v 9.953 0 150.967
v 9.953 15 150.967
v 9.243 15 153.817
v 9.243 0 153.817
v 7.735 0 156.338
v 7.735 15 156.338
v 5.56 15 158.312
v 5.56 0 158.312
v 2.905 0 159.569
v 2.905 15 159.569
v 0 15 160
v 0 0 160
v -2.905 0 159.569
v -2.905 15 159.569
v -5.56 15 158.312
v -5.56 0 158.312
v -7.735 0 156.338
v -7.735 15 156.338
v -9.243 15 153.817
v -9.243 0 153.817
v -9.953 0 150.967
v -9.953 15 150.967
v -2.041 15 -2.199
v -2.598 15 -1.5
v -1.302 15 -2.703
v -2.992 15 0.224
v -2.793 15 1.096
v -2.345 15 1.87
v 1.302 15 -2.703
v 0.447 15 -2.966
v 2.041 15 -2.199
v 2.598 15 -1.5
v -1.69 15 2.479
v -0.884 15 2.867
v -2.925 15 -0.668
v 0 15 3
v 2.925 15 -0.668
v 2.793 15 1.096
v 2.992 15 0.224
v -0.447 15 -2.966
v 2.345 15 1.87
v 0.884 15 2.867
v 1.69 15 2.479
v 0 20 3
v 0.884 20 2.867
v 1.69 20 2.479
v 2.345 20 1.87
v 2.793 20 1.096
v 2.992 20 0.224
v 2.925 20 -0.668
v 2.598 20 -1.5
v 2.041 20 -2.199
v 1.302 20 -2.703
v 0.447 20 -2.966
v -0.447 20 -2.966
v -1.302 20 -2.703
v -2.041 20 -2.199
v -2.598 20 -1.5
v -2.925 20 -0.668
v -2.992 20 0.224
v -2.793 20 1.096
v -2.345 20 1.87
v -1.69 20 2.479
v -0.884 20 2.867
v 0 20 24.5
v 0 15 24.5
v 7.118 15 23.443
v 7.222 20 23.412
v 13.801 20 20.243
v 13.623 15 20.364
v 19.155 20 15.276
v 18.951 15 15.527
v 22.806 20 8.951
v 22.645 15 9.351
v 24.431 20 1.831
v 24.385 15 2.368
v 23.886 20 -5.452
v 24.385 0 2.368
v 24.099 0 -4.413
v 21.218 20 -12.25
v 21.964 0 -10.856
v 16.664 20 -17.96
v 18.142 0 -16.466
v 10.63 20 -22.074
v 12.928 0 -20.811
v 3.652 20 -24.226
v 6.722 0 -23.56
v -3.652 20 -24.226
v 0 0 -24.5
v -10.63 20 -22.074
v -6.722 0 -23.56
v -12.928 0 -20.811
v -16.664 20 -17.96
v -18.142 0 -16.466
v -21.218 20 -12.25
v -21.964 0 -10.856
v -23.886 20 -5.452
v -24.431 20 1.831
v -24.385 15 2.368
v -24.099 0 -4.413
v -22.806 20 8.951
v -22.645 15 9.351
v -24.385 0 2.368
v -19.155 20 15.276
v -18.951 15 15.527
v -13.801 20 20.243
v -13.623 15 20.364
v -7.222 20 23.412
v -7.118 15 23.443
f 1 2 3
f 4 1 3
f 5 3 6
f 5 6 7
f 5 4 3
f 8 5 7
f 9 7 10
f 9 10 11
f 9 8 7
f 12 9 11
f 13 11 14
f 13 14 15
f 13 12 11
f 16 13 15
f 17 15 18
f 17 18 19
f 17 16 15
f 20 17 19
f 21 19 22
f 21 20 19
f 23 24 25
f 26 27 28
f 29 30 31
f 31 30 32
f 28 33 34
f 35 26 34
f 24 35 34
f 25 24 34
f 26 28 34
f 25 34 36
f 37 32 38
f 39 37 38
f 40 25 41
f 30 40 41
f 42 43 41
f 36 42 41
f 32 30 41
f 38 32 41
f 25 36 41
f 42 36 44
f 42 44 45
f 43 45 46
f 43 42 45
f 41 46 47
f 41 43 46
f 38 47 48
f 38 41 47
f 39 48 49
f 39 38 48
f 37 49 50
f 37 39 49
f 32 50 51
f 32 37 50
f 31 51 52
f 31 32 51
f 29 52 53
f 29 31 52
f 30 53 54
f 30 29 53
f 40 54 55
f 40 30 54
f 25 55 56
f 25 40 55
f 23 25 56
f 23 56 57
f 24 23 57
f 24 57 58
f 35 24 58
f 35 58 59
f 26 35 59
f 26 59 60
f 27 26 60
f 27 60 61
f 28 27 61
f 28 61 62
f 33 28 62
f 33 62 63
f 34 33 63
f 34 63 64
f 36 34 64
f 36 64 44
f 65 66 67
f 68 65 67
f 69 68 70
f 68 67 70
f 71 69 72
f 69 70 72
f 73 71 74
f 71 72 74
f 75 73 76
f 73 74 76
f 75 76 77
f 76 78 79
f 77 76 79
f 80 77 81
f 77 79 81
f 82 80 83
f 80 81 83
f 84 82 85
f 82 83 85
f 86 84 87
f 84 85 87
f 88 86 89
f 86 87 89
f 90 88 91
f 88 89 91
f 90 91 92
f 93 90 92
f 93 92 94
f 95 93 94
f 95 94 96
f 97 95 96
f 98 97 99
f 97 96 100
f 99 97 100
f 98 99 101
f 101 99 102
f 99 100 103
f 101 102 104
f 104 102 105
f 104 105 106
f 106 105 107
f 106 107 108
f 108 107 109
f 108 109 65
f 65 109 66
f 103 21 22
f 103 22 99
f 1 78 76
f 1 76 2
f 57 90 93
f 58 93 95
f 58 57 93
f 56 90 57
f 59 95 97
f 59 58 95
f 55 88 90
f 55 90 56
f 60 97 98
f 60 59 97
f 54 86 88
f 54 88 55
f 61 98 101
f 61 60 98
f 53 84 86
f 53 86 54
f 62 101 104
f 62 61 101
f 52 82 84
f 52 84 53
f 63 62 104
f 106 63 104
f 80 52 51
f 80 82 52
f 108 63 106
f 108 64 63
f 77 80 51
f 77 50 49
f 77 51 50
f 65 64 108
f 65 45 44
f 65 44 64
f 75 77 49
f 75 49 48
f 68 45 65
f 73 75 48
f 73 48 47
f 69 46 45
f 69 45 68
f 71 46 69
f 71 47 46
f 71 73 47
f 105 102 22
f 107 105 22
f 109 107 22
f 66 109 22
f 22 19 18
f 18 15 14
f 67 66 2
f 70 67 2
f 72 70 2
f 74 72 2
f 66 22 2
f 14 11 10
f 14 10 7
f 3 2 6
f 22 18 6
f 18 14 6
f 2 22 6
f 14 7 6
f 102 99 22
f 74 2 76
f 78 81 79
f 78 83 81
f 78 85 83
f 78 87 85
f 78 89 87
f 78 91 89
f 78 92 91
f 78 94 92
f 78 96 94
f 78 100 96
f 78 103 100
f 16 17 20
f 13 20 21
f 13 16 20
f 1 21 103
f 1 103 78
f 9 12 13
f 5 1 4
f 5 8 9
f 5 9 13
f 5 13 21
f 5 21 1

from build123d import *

# Parameters (mm, degrees)
CROQUIS1_R              = 24.5
CROQUIS1_R_2            = 3
SALIENTE_EXTRUIR1_DEPTH = 20
CROQUIS3_R              = 3
SALIENTE_EXTRUIR2_DEPTH = 15


with BuildPart() as part:
    # Croquis1 → Saliente-Extruir1 (new body)
    with BuildSketch(Plane(origin=(0, 0, 0), x_dir=(1, 0, 0), z_dir=(0, 1, 0))):
        with Locations(Location((0, 0, 0), (0, 0, 270))):
            Circle(CROQUIS1_R)
        with Locations(Location((0, 0, 0), (0, 0, 270))):
            Circle(CROQUIS1_R_2, mode=Mode.SUBTRACT)
    extrude(amount=SALIENTE_EXTRUIR1_DEPTH)

    # Croquis3 → Saliente-Extruir2 (add)
    with BuildSketch(Plane.XZ):
        with BuildLine():
            Line((-9.953168117, 150.966666667), (-24.385261863, 2.368333563))
            ThreePointArc((-24.385261863, 2.368333563), (1.09e-07, 24.5), (24.385261884, 2.368333346))
            Line((24.385261884, 2.368333346), (9.953168117, 150.966666667))
            ThreePointArc((9.953168117, 150.966666667), (0, 160), (-9.953168117, 150.966666667))
        make_face()
        Circle(CROQUIS3_R)
    extrude(amount=-SALIENTE_EXTRUIR2_DEPTH)


solid = part.part
